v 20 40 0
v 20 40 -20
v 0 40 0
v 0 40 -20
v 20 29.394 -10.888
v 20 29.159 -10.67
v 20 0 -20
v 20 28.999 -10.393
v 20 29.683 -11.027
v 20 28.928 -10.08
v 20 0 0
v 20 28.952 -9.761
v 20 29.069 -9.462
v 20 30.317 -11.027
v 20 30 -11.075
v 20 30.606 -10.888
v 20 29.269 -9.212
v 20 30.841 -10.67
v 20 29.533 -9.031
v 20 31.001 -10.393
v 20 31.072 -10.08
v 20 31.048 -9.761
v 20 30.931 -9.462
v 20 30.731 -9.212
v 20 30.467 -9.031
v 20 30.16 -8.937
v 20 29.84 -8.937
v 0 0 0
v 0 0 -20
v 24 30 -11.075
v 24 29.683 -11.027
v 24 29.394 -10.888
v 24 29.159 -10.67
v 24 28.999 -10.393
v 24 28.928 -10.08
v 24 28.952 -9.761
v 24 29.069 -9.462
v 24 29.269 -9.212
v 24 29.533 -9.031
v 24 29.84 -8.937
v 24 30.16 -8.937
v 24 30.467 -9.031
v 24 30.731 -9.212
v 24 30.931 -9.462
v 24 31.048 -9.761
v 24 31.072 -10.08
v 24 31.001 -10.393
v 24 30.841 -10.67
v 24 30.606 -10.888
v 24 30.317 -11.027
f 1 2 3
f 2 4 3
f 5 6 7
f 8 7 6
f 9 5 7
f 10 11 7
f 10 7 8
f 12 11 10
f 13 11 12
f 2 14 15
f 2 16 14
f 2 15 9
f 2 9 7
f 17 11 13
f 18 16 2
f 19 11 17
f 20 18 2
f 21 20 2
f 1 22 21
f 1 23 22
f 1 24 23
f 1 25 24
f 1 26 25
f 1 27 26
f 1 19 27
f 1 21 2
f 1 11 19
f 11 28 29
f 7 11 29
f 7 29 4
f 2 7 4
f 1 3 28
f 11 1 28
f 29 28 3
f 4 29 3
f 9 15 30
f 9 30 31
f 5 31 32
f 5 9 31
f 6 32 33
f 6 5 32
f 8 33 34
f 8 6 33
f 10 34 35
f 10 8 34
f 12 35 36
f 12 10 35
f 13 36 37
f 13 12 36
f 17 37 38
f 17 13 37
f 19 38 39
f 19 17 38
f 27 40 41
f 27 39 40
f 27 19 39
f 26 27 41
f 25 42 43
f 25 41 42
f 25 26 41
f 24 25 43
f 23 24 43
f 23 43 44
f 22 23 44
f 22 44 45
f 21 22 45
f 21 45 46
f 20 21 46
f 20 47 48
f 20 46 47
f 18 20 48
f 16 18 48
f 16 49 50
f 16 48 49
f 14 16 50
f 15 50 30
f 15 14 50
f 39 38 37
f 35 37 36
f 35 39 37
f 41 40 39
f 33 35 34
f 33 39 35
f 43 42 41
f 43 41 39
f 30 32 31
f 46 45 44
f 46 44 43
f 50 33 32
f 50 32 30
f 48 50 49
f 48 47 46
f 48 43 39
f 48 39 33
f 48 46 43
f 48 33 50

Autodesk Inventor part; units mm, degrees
ref_plane "YZ Plane" through (0, 0, 0) normal (1, 0, 0) x (0, 1, 0)
ref_plane "XZ Plane" through (0, 0, 0) normal (0, 1, 0) x (-1, 0, 0)
ref_plane "XY Plane" through (0, 0, 0) normal (0, 0, 1) x (1, 0, 0)
sketch "Эскиз1" plane through (0, 0, 0) normal (1, 0, 0) x (0, 1, 0)
  line L0 (0, 0) -> (0, -20)
  line L1 (0, -20) -> (40, -20)
  line L2 (40, -20) -> (40, 0)
  line L3 (40, 0) -> (0, 0)
  dimension "d0" = 40
  dimension "d1" = 20
extrude "Выдавливание1" add sketch "Эскиз1" along normal blind 20
sketch "Эскиз2" plane through (20, 0, 0) normal (1, 0, 0) x (0, 0, -1)
  circle A0 centre (10, 30) radius 1.0752
  line L0 (20, 0) -> (20, 40) projected
  line L1 (20, 40) -> (0, 40) projected
  point P0 (0, 0)
  dimension "d4" = 10
  dimension "d5" = 10
  dimension "d6" = 2.1503
extrude "Выдавливание2" add sketch "Эскиз2" along normal blind 4
properties part number "мотор"
